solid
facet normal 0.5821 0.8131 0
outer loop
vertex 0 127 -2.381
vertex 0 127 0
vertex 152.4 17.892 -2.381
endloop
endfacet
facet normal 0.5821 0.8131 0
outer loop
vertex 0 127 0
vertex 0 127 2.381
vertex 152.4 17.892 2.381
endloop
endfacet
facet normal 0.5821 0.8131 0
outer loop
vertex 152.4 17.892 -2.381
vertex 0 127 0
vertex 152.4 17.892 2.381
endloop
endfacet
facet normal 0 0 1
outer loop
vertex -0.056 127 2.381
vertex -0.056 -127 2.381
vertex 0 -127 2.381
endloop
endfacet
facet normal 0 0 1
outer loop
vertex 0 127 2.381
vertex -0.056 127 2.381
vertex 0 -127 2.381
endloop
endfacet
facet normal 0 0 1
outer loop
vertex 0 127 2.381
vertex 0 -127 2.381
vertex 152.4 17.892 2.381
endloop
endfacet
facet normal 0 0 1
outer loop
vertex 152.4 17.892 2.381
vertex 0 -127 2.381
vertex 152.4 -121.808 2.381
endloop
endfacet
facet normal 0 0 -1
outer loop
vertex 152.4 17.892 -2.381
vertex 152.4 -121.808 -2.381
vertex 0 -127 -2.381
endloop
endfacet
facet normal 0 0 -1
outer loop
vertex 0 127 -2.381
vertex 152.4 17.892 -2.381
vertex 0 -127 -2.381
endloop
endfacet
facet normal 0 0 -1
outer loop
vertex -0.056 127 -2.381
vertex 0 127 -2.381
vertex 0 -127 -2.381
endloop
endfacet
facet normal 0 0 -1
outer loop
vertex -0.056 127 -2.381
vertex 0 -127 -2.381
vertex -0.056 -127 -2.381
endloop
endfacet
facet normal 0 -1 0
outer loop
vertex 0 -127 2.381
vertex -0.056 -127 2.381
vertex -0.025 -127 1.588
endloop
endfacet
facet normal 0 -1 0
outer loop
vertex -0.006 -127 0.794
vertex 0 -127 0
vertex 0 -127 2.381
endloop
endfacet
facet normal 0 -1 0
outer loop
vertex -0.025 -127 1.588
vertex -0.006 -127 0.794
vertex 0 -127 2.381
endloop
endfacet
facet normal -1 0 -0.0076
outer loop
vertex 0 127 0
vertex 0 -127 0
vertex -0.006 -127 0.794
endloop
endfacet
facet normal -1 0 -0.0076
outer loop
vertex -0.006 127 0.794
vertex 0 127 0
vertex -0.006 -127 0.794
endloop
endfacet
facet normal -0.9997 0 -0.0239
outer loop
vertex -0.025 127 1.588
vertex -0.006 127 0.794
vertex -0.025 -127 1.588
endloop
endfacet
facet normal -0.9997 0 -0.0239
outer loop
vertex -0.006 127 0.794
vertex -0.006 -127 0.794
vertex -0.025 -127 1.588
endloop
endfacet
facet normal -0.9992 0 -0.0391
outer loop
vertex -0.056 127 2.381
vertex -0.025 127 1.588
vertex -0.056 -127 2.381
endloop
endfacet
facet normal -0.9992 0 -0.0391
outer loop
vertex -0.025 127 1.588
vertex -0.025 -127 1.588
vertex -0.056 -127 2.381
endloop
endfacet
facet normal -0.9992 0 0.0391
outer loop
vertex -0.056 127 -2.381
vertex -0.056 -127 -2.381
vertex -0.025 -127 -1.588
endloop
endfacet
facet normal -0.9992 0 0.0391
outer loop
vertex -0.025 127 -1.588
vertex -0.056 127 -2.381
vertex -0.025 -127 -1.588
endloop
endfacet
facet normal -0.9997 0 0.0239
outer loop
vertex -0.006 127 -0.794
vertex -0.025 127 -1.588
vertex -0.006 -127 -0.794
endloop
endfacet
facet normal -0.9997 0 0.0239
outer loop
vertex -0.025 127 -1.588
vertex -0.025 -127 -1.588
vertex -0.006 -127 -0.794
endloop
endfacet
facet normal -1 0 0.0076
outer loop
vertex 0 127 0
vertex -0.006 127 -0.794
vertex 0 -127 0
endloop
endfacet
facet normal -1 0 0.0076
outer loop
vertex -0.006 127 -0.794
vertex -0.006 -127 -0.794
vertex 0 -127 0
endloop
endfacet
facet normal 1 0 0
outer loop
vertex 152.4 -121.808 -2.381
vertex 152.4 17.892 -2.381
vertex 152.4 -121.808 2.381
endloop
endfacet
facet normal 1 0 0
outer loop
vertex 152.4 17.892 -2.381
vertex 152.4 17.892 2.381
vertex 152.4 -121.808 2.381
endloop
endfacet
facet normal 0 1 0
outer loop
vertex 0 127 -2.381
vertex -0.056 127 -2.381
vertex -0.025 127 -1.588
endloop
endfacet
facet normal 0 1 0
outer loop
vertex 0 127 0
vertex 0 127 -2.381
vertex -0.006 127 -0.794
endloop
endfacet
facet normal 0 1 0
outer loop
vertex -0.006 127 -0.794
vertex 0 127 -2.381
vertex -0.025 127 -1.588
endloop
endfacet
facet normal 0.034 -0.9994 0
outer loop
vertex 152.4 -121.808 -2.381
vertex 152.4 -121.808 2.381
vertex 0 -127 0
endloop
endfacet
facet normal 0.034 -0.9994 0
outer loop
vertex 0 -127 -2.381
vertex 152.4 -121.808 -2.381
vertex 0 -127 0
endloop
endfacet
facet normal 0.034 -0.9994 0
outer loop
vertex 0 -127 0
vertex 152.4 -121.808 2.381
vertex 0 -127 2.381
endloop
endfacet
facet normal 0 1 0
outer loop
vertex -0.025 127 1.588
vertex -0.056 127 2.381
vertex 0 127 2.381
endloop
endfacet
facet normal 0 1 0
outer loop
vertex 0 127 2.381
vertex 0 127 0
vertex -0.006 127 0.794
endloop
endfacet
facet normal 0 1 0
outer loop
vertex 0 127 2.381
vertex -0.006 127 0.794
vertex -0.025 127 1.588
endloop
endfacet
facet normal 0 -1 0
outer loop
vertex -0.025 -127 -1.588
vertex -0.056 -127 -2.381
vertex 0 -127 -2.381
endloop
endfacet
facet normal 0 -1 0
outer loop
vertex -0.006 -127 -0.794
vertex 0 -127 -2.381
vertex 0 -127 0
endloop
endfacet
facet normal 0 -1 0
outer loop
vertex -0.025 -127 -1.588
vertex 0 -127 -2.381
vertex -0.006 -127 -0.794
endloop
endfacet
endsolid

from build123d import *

# Parameters (mm, degrees)
BOSS_EXTRUDE1_DEPTH      = 2.38125
BOSS_EXTRUDE2_DEPTH      = 27
BOSS_EXTRUDE2_DEPTH_BACK = 227


with BuildPart() as part:
    # Sketch1 → Boss-Extrude1 (new, symmetric)
    with BuildSketch(Plane.XY):
        Polygon((0, -127), (0, 127), (152.4, 17.892316301), (152.4, -121.807683699), align=None)
    extrude(amount=BOSS_EXTRUDE1_DEPTH, both=True)

    # Sketch4 → Boss-Extrude2 (add, two sides: drawn at the far end of the back side and taken through both)
    with BuildSketch(Plane(origin=(0, 100, 0), x_dir=(1, 0, 0), z_dir=(0, 1, 0)).offset(-BOSS_EXTRUDE2_DEPTH_BACK)):
        with BuildLine():
            Line((0, -2.38125), (0, 0))
            ThreePointArc((0, 0), (-0.01389267, -1.190949078), (-0.055563118, -2.38125))
            Line((-0.055563118, -2.38125), (0, -2.38125))
        make_face()
        with BuildLine():
            Line((0, 0), (0, 2.38125))
            Line((0, 2.38125), (-0.055563118, 2.38125))
            ThreePointArc((-0.055563118, 2.38125), (-0.01389267, 1.190949078), (0, 0))
        make_face()
    extrude(amount=BOSS_EXTRUDE2_DEPTH + BOSS_EXTRUDE2_DEPTH_BACK)


solid = part.part
